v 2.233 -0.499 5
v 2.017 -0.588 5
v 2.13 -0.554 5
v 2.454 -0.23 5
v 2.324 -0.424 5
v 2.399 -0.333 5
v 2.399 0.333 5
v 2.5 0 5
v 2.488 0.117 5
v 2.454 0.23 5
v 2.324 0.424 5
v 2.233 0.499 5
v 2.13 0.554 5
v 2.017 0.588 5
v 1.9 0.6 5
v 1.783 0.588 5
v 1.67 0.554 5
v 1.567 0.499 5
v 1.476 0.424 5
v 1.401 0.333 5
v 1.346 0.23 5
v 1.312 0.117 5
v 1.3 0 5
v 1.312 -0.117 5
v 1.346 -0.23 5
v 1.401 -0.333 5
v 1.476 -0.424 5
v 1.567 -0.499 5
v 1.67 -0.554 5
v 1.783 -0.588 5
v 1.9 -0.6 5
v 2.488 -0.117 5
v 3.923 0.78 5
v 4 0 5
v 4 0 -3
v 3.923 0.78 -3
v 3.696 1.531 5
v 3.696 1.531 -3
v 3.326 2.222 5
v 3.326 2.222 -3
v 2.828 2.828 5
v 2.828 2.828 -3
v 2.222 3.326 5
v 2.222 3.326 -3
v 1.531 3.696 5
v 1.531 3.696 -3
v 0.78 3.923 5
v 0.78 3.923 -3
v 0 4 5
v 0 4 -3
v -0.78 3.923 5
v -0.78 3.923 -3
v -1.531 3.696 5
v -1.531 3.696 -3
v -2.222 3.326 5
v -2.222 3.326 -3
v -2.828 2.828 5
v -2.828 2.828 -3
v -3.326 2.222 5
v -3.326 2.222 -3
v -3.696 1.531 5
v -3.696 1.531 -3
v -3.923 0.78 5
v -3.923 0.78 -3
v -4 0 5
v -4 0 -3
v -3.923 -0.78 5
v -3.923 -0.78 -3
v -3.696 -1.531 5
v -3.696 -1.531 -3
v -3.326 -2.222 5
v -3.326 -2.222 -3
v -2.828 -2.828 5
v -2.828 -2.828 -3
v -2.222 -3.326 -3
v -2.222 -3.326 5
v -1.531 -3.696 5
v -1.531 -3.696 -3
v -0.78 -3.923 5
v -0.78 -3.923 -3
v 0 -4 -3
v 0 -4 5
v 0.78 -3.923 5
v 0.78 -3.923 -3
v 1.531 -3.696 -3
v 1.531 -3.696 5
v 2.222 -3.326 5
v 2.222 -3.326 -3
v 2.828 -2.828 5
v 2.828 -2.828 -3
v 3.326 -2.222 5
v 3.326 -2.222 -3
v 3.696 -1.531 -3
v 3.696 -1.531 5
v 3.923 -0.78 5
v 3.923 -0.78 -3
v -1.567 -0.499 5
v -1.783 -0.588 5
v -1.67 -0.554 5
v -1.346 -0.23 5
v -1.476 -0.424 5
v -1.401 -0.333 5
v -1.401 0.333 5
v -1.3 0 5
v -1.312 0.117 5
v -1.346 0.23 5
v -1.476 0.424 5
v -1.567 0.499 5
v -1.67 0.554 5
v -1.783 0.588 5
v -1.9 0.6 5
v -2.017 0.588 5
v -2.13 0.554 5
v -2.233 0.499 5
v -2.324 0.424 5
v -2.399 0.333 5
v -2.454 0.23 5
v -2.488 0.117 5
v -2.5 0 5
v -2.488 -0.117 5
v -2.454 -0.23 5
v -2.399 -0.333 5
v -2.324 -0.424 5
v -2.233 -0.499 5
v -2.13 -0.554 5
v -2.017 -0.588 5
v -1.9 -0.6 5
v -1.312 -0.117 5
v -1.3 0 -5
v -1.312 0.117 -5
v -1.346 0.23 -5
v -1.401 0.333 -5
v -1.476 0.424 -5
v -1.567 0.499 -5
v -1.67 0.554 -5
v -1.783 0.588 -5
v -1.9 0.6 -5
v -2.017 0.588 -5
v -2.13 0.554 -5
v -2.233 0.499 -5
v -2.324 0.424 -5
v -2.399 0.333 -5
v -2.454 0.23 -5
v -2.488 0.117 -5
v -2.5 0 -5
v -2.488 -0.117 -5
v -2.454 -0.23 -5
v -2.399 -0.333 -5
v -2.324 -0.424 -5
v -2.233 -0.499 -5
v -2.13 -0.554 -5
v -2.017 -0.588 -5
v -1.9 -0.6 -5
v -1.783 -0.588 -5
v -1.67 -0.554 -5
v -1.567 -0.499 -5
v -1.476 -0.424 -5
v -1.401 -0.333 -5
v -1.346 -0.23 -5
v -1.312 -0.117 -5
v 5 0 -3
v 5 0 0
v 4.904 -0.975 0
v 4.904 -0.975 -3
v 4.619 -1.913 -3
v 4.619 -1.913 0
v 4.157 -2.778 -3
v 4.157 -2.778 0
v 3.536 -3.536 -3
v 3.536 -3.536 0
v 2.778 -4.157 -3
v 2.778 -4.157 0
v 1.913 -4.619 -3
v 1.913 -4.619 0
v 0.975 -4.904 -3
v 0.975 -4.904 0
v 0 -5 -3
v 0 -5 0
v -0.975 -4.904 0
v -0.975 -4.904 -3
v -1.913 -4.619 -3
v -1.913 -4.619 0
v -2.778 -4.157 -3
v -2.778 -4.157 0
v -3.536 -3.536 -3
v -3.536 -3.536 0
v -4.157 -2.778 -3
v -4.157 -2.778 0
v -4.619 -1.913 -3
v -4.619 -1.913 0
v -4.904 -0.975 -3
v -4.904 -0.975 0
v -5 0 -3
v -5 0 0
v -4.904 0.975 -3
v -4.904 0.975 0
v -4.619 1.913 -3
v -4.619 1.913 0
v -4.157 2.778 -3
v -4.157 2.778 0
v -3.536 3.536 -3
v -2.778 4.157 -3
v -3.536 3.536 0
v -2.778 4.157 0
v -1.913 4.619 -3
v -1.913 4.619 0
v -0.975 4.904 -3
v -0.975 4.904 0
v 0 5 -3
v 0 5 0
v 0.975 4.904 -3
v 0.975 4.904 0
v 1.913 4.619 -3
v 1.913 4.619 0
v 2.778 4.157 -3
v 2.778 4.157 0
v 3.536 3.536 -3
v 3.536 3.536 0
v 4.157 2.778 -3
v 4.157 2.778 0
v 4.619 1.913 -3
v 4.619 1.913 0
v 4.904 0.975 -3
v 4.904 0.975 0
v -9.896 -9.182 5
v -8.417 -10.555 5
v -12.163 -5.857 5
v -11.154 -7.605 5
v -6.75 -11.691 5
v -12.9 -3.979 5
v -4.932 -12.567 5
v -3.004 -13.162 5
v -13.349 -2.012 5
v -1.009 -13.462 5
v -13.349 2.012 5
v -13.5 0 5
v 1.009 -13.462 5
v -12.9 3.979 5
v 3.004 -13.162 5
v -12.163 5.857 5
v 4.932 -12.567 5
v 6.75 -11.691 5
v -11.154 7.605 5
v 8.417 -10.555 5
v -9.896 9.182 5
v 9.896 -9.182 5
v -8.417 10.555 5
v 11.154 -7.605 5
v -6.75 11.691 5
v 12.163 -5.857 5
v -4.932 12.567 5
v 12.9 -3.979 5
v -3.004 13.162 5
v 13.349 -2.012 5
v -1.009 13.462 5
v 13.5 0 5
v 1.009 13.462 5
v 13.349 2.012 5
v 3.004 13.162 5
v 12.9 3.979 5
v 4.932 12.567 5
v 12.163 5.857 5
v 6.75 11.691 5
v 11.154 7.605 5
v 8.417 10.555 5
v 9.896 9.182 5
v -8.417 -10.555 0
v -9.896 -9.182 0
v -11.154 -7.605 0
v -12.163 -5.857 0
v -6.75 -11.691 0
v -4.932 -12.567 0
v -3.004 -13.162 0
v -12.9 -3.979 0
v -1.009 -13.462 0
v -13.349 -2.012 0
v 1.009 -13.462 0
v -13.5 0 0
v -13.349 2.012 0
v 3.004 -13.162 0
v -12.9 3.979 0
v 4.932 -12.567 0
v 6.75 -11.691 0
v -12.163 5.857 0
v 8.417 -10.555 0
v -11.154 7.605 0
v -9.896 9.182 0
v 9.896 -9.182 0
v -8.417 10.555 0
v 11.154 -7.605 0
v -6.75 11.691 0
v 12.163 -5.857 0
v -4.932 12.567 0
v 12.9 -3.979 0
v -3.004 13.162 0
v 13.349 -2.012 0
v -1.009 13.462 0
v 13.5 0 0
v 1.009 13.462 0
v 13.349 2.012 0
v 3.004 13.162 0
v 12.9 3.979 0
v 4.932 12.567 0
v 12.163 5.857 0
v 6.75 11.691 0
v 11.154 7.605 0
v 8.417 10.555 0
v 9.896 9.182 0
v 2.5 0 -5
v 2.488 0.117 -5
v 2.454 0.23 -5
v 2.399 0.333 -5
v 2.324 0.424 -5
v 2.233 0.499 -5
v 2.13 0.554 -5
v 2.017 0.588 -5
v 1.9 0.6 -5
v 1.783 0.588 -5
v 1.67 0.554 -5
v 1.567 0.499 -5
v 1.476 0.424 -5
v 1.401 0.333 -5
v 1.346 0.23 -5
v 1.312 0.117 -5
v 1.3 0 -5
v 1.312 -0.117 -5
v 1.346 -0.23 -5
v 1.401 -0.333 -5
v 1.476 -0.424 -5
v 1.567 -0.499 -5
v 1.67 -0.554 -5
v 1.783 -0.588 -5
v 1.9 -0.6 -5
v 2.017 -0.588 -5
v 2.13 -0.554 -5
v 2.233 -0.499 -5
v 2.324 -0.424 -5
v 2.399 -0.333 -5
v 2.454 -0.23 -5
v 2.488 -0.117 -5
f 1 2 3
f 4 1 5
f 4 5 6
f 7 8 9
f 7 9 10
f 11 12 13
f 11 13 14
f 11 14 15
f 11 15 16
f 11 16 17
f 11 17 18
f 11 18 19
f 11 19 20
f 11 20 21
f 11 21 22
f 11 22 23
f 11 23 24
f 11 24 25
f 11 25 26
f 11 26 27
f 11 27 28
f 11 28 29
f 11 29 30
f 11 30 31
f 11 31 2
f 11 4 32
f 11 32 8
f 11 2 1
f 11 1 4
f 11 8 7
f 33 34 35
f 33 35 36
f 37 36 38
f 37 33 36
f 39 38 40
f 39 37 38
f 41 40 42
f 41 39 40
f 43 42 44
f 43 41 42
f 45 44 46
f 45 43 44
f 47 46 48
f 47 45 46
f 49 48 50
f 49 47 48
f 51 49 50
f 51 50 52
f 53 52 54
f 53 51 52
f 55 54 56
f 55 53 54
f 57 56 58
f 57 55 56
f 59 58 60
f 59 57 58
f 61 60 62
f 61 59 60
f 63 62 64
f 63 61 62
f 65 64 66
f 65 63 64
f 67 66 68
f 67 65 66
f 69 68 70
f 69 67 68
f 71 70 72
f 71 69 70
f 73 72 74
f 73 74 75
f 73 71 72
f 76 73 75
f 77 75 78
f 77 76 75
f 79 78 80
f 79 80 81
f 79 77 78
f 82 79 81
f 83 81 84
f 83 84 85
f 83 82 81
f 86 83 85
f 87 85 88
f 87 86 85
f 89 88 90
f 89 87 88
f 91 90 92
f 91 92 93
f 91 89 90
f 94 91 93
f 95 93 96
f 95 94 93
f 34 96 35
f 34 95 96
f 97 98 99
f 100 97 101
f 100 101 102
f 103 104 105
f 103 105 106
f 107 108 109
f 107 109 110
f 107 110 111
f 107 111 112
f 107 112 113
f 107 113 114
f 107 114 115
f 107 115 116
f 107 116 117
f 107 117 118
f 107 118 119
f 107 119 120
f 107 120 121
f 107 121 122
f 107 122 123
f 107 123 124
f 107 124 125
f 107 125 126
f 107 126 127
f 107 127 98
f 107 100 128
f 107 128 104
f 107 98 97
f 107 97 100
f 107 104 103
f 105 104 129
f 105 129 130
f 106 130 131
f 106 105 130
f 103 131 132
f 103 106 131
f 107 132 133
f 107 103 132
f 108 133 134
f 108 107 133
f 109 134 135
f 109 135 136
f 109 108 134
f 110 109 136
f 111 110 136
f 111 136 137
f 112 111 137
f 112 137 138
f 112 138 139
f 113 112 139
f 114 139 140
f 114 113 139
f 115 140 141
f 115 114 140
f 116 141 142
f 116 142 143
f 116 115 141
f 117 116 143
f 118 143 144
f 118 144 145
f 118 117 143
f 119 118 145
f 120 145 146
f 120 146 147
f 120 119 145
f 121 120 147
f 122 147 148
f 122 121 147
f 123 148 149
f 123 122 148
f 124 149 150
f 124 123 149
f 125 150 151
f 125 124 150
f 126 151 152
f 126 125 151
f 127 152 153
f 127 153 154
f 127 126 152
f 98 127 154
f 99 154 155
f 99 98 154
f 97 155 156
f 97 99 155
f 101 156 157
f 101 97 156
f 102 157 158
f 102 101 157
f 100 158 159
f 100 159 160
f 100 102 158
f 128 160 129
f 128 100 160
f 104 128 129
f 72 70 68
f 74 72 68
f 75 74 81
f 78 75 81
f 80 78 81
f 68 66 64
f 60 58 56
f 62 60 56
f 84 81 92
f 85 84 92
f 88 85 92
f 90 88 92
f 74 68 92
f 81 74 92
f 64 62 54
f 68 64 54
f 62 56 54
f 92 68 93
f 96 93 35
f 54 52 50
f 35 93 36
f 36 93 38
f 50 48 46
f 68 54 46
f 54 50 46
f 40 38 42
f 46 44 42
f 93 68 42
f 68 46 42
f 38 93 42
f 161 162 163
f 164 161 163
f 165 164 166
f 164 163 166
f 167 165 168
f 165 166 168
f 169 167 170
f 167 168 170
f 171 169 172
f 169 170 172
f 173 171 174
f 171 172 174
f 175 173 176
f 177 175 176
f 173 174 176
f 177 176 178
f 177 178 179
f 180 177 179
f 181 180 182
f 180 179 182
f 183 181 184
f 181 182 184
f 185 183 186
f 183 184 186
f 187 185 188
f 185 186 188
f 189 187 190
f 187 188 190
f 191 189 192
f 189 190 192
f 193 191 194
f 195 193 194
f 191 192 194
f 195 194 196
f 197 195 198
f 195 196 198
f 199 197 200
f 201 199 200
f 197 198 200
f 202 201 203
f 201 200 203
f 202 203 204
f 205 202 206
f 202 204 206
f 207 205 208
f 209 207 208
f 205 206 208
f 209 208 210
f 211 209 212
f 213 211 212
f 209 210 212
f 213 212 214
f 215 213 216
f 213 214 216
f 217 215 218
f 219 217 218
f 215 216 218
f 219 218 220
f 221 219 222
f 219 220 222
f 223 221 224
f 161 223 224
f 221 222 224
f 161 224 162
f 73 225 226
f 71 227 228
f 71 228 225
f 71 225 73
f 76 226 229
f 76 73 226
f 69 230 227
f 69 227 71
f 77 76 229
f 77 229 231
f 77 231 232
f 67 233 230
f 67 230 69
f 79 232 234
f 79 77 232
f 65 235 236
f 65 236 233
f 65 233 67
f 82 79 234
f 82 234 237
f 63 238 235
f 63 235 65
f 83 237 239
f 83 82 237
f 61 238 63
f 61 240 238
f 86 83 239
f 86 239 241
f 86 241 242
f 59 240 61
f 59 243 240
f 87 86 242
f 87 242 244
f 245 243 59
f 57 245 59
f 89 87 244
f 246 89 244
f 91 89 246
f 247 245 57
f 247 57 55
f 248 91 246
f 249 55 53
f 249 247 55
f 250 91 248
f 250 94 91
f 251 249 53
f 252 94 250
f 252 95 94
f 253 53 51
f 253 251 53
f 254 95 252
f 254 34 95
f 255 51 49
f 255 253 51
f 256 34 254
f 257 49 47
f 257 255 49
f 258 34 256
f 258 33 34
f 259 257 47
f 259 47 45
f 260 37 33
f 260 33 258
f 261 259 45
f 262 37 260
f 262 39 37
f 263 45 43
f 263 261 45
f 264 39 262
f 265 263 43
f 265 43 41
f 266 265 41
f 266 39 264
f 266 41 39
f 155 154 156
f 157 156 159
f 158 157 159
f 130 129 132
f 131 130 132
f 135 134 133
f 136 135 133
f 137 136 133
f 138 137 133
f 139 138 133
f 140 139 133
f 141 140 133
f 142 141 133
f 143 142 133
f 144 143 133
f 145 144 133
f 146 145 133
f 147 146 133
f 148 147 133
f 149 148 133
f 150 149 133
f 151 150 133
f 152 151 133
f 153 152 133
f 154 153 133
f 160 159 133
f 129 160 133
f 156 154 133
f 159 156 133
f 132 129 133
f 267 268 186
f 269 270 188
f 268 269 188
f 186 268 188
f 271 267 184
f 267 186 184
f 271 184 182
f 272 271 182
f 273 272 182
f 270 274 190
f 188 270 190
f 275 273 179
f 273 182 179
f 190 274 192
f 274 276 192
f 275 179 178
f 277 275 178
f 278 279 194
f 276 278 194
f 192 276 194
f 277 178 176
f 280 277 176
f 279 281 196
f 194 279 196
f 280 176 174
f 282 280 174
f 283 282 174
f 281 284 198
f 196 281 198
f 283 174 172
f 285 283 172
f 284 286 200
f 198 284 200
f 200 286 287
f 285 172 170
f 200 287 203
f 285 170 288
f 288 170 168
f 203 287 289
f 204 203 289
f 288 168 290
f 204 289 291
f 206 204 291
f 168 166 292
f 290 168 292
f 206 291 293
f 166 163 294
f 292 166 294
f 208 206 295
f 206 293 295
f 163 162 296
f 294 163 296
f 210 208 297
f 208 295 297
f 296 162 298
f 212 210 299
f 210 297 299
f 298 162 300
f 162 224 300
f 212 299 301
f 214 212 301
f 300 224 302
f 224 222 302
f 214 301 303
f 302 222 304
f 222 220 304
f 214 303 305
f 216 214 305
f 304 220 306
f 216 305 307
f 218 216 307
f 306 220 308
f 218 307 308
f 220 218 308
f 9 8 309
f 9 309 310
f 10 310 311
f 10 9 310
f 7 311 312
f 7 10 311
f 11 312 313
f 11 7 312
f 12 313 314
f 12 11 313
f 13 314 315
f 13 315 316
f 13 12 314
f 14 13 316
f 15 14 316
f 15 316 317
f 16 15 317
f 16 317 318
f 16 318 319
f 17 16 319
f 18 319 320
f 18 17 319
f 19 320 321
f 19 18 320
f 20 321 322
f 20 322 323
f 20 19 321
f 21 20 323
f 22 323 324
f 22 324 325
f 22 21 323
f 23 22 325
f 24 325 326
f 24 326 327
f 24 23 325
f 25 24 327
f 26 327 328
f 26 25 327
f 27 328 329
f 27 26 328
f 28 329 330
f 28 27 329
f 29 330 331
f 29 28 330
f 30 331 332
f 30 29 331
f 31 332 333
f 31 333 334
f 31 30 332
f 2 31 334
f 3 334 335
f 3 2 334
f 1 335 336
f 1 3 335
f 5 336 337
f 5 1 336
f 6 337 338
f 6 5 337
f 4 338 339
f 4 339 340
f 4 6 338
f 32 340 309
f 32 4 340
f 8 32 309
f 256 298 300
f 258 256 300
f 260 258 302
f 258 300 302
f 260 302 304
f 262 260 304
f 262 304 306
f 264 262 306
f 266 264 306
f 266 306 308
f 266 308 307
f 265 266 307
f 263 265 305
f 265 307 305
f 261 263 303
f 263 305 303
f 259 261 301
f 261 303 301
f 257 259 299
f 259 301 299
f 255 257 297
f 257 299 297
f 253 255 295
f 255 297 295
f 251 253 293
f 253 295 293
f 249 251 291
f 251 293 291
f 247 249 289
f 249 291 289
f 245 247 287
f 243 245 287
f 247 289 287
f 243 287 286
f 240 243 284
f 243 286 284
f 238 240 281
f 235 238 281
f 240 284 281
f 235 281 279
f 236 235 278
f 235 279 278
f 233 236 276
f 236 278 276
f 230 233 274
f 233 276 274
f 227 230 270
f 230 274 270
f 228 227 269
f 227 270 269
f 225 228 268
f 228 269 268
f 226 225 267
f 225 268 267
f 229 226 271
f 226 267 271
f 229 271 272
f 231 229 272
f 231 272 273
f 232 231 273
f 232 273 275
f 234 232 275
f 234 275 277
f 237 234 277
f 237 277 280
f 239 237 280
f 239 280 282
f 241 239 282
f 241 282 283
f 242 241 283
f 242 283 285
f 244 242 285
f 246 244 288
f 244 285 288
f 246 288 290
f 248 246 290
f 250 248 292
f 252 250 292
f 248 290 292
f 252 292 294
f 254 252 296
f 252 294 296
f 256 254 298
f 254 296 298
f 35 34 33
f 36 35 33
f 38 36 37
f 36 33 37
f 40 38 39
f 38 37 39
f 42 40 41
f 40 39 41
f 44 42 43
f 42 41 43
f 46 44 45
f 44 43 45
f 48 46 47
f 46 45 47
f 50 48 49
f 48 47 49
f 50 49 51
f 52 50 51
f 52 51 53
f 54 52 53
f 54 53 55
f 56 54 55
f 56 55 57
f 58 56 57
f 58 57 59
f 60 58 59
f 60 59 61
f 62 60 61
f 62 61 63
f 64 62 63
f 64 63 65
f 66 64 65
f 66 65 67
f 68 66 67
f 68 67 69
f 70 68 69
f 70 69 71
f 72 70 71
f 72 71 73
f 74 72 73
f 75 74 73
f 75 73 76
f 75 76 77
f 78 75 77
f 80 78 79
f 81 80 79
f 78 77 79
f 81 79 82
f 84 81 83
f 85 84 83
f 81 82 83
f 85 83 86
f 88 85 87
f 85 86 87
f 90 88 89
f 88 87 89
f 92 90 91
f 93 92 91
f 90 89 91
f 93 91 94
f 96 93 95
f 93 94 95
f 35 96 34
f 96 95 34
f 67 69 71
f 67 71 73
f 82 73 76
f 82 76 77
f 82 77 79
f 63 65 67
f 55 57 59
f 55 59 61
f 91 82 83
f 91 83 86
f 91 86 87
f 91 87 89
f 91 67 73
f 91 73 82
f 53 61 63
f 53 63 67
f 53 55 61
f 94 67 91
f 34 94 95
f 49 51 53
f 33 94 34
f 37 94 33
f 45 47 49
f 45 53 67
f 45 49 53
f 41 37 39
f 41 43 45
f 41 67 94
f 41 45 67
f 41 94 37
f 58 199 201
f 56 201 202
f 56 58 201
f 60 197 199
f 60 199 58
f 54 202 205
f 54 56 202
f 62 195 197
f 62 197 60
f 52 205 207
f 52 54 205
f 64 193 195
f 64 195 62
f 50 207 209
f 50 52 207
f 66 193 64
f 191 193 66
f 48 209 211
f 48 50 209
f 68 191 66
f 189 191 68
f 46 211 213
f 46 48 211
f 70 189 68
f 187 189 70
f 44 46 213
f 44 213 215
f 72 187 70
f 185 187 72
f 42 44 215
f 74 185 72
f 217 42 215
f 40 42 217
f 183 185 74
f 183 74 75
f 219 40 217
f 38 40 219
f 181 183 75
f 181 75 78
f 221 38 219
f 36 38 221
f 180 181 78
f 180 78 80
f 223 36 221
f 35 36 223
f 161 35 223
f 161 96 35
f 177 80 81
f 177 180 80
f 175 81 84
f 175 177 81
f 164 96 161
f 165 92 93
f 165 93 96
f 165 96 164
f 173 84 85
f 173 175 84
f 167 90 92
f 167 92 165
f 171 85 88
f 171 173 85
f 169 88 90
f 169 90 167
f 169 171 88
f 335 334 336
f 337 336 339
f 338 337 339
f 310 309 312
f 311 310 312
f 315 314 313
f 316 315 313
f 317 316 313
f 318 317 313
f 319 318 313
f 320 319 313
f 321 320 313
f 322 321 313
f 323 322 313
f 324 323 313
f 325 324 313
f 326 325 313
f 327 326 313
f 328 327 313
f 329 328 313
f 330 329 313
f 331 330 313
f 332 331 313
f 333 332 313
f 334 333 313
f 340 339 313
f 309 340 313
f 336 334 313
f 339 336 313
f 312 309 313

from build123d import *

# Parameters (mm, degrees)
F0_R     = 13.5
F1_DEPTH = 5
F2_R     = 5
F3_DEPTH = 3
F4_R     = 4
F5_DEPTH = 25
F6_R     = 4
F7_DEPTH = 8
F8_R     = 0.6
F9_DEPTH = 10


with BuildPart() as f1:
    # F0 (on Top) → F1 (new body)
    with BuildSketch(Plane.XY):
        Circle(F0_R)
    extrude(amount=F1_DEPTH)

    # F2 (on face) → F3 (join)
    with BuildSketch(Plane(origin=(0, 0, 0), x_dir=(1, 0, 0), z_dir=(0, 0, -1))):
        Circle(F2_R)
    extrude(amount=F3_DEPTH)

    # F4 (on face) → F5 (cut)
    with BuildSketch(Plane.XY.offset(5)):
        Circle(F4_R)
    extrude(amount=-F5_DEPTH, mode=Mode.SUBTRACT)


with BuildPart() as f7:
    # F6 (on face) → F7 (new body)
    with BuildSketch(Plane.XY.offset(5)):
        Circle(F6_R)
    extrude(amount=-F7_DEPTH)


with BuildPart() as f9:
    # F8 (on face) → F9 (new body)
    with BuildSketch(Plane.XY.offset(5)):
        with Locations((-1.9, 0)):
            Circle(F8_R)
        with Locations((1.9, 0)):
            Circle(F8_R)
    extrude(amount=-F9_DEPTH)


solid = Compound([f1.part, f7.part, f9.part])
